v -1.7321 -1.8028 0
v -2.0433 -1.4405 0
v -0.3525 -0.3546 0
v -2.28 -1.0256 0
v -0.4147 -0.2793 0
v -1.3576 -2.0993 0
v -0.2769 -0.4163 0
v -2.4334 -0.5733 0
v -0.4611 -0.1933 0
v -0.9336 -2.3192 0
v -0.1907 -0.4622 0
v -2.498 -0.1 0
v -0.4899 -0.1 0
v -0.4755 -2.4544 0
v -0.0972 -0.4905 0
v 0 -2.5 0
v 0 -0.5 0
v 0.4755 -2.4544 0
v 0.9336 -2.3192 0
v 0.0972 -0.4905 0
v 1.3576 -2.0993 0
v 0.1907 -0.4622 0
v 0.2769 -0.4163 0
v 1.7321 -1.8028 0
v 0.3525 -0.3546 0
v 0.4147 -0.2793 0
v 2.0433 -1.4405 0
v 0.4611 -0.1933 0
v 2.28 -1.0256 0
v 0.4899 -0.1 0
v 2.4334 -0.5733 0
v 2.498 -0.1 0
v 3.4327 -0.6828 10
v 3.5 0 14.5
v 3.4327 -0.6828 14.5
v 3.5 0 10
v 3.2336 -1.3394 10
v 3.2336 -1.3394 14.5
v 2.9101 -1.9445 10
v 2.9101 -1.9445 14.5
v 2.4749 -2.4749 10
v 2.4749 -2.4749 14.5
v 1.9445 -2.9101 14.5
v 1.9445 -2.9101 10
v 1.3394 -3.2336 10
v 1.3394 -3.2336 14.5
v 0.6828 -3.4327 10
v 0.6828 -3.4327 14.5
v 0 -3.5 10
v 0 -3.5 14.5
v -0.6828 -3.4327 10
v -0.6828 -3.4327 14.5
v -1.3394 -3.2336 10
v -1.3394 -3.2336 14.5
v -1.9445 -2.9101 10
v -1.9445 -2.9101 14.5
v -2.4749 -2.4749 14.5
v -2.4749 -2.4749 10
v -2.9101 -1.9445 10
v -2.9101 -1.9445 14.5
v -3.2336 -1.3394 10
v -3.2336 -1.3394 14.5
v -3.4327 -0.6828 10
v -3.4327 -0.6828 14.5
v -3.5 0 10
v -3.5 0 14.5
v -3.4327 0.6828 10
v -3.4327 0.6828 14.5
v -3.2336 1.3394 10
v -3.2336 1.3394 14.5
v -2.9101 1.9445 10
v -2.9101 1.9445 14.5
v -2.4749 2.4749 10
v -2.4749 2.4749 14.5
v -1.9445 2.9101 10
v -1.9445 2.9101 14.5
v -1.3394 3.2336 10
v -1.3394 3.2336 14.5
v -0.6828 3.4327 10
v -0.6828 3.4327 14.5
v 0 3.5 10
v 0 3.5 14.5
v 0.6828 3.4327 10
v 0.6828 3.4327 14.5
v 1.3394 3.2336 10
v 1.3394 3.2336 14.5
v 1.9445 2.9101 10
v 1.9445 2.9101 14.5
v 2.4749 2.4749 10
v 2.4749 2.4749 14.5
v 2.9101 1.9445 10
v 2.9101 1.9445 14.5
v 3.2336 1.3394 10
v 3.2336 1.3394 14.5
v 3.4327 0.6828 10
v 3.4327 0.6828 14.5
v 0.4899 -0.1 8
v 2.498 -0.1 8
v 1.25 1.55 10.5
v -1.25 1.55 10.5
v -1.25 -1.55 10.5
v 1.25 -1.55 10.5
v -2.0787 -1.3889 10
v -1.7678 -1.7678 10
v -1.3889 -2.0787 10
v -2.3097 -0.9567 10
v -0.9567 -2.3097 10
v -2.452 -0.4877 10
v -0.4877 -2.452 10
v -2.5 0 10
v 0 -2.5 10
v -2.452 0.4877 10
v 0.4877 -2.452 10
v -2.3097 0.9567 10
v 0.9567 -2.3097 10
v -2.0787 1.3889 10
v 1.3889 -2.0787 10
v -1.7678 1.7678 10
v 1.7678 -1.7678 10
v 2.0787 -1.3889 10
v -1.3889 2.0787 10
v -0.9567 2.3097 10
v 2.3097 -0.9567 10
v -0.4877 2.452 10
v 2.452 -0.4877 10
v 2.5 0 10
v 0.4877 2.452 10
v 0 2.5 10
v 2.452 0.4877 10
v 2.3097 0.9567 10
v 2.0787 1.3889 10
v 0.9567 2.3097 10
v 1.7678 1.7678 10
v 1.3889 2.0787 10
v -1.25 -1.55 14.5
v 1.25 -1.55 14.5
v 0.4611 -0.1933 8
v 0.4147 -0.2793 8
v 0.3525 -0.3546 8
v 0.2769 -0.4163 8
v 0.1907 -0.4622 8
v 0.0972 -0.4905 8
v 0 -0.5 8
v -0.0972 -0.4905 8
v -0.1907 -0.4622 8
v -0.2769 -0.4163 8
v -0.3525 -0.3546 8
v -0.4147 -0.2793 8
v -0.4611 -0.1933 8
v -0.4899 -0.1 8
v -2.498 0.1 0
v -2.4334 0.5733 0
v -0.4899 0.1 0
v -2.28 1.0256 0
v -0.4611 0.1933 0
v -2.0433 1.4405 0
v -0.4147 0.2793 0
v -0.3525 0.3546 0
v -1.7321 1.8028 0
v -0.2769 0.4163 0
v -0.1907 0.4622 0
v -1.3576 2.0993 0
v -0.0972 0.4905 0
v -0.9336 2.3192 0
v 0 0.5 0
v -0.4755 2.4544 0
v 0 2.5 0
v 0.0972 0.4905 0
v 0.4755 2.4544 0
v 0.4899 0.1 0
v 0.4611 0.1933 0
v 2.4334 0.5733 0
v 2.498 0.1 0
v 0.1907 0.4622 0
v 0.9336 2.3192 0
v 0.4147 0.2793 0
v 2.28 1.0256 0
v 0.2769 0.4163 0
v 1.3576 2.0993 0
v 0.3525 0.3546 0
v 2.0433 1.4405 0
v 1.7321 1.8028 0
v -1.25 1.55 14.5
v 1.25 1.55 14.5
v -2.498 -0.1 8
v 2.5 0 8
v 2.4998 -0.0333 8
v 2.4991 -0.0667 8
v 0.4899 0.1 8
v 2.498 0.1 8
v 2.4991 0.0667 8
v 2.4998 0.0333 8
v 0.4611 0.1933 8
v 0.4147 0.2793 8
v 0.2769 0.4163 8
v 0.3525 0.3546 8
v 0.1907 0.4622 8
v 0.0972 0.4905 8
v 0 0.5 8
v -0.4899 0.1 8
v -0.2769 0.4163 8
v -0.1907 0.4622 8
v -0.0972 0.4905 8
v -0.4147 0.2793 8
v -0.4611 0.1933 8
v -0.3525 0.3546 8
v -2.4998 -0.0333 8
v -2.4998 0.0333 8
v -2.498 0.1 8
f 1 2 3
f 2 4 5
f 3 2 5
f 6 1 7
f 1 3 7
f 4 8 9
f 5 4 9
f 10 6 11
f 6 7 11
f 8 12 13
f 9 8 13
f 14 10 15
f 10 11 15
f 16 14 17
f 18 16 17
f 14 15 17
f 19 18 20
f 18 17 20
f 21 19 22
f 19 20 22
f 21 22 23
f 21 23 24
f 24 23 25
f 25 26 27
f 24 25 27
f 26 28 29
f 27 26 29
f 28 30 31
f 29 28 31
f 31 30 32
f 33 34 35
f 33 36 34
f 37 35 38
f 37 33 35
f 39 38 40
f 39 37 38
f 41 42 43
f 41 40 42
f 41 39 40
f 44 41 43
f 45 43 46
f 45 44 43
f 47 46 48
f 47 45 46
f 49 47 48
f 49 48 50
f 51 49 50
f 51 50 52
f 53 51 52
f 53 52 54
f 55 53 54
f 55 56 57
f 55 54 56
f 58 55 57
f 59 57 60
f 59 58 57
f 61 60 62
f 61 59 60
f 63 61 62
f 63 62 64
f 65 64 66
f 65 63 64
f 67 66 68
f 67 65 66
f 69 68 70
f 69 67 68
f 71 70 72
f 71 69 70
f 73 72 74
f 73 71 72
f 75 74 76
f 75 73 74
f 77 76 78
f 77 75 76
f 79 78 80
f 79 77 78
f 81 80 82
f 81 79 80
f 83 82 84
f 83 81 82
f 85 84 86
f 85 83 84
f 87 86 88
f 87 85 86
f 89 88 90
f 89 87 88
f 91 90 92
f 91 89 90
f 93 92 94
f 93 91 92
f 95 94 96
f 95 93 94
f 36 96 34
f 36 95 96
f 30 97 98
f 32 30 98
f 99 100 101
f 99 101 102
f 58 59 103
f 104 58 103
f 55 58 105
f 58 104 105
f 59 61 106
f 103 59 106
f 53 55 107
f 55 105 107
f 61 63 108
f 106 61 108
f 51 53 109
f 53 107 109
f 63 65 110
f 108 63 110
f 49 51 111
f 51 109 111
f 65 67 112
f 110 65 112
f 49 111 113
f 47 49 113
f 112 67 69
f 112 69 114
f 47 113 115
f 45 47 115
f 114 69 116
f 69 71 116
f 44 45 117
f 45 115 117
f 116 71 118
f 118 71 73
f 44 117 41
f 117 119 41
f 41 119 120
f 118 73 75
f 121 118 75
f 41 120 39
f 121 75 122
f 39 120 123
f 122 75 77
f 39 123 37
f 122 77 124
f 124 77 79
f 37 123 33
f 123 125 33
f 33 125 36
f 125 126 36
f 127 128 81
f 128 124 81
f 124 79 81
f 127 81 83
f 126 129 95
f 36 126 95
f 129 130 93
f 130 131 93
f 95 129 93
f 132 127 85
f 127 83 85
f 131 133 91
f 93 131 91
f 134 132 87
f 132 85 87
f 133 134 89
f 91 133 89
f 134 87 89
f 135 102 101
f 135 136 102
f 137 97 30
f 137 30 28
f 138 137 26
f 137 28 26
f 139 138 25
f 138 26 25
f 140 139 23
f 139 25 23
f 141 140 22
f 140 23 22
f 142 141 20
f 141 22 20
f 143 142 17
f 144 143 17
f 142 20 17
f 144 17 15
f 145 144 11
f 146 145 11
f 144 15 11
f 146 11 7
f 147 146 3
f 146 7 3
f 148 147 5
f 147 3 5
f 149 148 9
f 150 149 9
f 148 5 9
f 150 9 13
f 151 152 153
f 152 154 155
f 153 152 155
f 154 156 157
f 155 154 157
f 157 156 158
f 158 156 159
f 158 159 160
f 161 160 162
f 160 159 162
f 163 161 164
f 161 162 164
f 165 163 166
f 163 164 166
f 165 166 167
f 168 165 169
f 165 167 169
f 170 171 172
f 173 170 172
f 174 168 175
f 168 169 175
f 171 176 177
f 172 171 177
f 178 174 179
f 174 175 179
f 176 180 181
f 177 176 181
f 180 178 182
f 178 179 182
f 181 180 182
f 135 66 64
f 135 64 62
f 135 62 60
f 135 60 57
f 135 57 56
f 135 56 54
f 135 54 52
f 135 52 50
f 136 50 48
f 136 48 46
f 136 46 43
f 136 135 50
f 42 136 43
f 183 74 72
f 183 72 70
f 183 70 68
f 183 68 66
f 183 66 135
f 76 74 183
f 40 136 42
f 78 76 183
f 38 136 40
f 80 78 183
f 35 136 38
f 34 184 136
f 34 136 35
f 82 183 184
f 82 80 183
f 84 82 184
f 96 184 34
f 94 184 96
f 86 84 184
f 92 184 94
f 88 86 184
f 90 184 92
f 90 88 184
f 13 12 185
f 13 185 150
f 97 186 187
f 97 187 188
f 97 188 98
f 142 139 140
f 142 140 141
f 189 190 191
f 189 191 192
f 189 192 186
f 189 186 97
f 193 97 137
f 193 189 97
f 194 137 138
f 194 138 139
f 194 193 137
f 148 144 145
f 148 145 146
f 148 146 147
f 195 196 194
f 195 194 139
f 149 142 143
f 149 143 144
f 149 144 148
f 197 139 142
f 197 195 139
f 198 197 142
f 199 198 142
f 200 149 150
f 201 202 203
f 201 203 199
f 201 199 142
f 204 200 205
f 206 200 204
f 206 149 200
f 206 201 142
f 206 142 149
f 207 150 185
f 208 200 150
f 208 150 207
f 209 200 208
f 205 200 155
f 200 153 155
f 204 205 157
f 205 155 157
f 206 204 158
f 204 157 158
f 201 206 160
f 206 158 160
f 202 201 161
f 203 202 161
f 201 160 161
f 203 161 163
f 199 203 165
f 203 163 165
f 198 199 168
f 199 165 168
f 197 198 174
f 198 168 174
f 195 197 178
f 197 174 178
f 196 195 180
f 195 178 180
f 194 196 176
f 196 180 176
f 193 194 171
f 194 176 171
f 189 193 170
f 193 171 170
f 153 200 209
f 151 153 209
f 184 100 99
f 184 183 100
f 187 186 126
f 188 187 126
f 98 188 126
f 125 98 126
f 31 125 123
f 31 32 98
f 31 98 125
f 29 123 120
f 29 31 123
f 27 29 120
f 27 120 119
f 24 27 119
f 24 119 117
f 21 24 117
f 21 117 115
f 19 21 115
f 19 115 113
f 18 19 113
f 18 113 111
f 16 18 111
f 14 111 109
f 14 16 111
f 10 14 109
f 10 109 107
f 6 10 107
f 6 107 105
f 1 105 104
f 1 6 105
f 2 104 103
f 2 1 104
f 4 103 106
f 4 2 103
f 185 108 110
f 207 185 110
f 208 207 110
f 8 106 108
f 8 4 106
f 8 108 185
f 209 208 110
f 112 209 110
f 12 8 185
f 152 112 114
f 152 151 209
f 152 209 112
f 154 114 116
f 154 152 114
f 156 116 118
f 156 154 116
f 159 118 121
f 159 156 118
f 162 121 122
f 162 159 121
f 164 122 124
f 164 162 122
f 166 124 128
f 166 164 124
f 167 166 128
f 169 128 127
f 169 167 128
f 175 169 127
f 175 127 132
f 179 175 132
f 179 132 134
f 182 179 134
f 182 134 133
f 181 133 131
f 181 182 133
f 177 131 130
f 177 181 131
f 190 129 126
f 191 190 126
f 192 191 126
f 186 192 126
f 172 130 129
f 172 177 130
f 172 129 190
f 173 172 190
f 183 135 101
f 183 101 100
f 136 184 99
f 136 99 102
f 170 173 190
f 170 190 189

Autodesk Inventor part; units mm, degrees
ref_plane "YZ Plane" through (0, 0, 0) normal (1, 0, 0) x (0, 1, 0)
ref_plane "XZ Plane" through (0, 0, 0) normal (0, 1, 0) x (-1, 0, 0)
ref_plane "XY Plane" through (0, 0, 0) normal (0, 0, 1) x (1, 0, 0)
sketch "Sketch1" plane through (0, 0, 0) normal (0, 0, 1) x (1, 0, 0)
  circle A0 centre (0, 0) radius 2.5
  dimension "d0" = 5
extrude "Extrusion1" add sketch "Sketch1" along normal blind 10
sketch "Sketch2" plane through (0, 0, 10) normal (0, 0, 1) x (1, 0, 0)
  circle A0 centre (0, 0) radius 3.5
  dimension "d3" = 7
extrude "Extrusion2" add sketch "Sketch2" along normal blind 4.5
sketch "Sketch3" plane through (0, 0, 14.5) normal (0, 0, 1) x (1, 0, 0)
  line L0 (-1.25, 1.55) -> (1.25, 1.55)
  line L1 (1.25, 1.55) -> (1.25, -1.55)
  line L2 (1.25, -1.55) -> (-1.25, -1.55)
  line L3 (-1.25, -1.55) -> (-1.25, 1.55)
  point P0 (0, 0)
  point P1 (-1.25, 0)
  point P2 (0, 1.55)
  dimension "d6" = 2.5
  dimension "d7" = 3.1
extrude "Extrusion3" cut sketch "Sketch3" against normal blind 4
sketch "Sketch4" plane through (0, 0, 0) normal (0, 0, -1) x (-1, 0, 0)
  circle A0 centre (0, 0) radius 0.5
  line L0 (2.5, -0.1) -> (-2.5, -0.1)
  line L1 (-2.5, -0.1) -> (-2.5, 0.1)
  line L2 (-2.5, 0.1) -> (2.5, 0.1)
  line L3 (2.5, 0.1) -> (2.5, -0.1)
  point P0 (0, -0.1)
  point P1 (2.5, 0)
  point P2 (-0.4899, 0.1)
  point P3 (-0.4899, -0.1)
  point P4 (0.4899, -0.1)
  point P5 (0.4899, 0.1)
  dimension "d10" = 1
  dimension "d11" = 5
  dimension "d12" = 0.2
extrude "Extrusion4" cut sketch "Sketch4" against normal blind 8
properties part number "Magnethalter"
